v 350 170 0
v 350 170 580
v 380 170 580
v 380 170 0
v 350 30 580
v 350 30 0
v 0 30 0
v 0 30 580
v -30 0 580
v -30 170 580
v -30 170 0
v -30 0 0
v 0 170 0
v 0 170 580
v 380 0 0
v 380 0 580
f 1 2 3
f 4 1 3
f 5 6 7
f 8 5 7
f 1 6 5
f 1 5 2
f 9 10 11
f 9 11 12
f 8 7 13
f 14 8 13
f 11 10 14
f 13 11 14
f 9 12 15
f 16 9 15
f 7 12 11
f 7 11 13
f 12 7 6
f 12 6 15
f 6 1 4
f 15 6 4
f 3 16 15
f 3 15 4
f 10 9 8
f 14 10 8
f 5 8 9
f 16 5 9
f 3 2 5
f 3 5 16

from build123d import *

# Parameters (mm, degrees)
ESQUISSE1_W        = 30
ESQUISSE1_H        = 140
ESQUISSE1_H_2      = 30
ESQUISSE1_W_2      = 350
BOSS_EXTRU_1_DEPTH = 580


with BuildPart() as part:
    # Esquisse1 → Boss.-Extru.1 (new body)
    with BuildSketch(Plane.XY):
        with Locations((-15, 100)):
            Rectangle(ESQUISSE1_W, ESQUISSE1_H)
        with Locations((-15, 15)):
            Rectangle(ESQUISSE1_W, ESQUISSE1_H_2)
        with Locations((175, 15)):
            Rectangle(ESQUISSE1_W_2, ESQUISSE1_H_2)
        with Locations((365, 15)):
            Rectangle(ESQUISSE1_W, ESQUISSE1_H_2)
        with Locations((365, 100)):
            Rectangle(ESQUISSE1_W, ESQUISSE1_H)
        Polygon((-30, 170), (-30, 152.681524316), (-15, 161.340762158), align=None)
        Polygon((-15, 161.340762158), (0, 170), (-30, 170), align=None)
        Polygon((-15, 161.340762158), (0, 152.681524316), (0, 170), align=None)
        Polygon((380, 170), (350, 170), (380, 152.681524316), align=None)
    extrude(amount=BOSS_EXTRU_1_DEPTH)


solid = part.part
